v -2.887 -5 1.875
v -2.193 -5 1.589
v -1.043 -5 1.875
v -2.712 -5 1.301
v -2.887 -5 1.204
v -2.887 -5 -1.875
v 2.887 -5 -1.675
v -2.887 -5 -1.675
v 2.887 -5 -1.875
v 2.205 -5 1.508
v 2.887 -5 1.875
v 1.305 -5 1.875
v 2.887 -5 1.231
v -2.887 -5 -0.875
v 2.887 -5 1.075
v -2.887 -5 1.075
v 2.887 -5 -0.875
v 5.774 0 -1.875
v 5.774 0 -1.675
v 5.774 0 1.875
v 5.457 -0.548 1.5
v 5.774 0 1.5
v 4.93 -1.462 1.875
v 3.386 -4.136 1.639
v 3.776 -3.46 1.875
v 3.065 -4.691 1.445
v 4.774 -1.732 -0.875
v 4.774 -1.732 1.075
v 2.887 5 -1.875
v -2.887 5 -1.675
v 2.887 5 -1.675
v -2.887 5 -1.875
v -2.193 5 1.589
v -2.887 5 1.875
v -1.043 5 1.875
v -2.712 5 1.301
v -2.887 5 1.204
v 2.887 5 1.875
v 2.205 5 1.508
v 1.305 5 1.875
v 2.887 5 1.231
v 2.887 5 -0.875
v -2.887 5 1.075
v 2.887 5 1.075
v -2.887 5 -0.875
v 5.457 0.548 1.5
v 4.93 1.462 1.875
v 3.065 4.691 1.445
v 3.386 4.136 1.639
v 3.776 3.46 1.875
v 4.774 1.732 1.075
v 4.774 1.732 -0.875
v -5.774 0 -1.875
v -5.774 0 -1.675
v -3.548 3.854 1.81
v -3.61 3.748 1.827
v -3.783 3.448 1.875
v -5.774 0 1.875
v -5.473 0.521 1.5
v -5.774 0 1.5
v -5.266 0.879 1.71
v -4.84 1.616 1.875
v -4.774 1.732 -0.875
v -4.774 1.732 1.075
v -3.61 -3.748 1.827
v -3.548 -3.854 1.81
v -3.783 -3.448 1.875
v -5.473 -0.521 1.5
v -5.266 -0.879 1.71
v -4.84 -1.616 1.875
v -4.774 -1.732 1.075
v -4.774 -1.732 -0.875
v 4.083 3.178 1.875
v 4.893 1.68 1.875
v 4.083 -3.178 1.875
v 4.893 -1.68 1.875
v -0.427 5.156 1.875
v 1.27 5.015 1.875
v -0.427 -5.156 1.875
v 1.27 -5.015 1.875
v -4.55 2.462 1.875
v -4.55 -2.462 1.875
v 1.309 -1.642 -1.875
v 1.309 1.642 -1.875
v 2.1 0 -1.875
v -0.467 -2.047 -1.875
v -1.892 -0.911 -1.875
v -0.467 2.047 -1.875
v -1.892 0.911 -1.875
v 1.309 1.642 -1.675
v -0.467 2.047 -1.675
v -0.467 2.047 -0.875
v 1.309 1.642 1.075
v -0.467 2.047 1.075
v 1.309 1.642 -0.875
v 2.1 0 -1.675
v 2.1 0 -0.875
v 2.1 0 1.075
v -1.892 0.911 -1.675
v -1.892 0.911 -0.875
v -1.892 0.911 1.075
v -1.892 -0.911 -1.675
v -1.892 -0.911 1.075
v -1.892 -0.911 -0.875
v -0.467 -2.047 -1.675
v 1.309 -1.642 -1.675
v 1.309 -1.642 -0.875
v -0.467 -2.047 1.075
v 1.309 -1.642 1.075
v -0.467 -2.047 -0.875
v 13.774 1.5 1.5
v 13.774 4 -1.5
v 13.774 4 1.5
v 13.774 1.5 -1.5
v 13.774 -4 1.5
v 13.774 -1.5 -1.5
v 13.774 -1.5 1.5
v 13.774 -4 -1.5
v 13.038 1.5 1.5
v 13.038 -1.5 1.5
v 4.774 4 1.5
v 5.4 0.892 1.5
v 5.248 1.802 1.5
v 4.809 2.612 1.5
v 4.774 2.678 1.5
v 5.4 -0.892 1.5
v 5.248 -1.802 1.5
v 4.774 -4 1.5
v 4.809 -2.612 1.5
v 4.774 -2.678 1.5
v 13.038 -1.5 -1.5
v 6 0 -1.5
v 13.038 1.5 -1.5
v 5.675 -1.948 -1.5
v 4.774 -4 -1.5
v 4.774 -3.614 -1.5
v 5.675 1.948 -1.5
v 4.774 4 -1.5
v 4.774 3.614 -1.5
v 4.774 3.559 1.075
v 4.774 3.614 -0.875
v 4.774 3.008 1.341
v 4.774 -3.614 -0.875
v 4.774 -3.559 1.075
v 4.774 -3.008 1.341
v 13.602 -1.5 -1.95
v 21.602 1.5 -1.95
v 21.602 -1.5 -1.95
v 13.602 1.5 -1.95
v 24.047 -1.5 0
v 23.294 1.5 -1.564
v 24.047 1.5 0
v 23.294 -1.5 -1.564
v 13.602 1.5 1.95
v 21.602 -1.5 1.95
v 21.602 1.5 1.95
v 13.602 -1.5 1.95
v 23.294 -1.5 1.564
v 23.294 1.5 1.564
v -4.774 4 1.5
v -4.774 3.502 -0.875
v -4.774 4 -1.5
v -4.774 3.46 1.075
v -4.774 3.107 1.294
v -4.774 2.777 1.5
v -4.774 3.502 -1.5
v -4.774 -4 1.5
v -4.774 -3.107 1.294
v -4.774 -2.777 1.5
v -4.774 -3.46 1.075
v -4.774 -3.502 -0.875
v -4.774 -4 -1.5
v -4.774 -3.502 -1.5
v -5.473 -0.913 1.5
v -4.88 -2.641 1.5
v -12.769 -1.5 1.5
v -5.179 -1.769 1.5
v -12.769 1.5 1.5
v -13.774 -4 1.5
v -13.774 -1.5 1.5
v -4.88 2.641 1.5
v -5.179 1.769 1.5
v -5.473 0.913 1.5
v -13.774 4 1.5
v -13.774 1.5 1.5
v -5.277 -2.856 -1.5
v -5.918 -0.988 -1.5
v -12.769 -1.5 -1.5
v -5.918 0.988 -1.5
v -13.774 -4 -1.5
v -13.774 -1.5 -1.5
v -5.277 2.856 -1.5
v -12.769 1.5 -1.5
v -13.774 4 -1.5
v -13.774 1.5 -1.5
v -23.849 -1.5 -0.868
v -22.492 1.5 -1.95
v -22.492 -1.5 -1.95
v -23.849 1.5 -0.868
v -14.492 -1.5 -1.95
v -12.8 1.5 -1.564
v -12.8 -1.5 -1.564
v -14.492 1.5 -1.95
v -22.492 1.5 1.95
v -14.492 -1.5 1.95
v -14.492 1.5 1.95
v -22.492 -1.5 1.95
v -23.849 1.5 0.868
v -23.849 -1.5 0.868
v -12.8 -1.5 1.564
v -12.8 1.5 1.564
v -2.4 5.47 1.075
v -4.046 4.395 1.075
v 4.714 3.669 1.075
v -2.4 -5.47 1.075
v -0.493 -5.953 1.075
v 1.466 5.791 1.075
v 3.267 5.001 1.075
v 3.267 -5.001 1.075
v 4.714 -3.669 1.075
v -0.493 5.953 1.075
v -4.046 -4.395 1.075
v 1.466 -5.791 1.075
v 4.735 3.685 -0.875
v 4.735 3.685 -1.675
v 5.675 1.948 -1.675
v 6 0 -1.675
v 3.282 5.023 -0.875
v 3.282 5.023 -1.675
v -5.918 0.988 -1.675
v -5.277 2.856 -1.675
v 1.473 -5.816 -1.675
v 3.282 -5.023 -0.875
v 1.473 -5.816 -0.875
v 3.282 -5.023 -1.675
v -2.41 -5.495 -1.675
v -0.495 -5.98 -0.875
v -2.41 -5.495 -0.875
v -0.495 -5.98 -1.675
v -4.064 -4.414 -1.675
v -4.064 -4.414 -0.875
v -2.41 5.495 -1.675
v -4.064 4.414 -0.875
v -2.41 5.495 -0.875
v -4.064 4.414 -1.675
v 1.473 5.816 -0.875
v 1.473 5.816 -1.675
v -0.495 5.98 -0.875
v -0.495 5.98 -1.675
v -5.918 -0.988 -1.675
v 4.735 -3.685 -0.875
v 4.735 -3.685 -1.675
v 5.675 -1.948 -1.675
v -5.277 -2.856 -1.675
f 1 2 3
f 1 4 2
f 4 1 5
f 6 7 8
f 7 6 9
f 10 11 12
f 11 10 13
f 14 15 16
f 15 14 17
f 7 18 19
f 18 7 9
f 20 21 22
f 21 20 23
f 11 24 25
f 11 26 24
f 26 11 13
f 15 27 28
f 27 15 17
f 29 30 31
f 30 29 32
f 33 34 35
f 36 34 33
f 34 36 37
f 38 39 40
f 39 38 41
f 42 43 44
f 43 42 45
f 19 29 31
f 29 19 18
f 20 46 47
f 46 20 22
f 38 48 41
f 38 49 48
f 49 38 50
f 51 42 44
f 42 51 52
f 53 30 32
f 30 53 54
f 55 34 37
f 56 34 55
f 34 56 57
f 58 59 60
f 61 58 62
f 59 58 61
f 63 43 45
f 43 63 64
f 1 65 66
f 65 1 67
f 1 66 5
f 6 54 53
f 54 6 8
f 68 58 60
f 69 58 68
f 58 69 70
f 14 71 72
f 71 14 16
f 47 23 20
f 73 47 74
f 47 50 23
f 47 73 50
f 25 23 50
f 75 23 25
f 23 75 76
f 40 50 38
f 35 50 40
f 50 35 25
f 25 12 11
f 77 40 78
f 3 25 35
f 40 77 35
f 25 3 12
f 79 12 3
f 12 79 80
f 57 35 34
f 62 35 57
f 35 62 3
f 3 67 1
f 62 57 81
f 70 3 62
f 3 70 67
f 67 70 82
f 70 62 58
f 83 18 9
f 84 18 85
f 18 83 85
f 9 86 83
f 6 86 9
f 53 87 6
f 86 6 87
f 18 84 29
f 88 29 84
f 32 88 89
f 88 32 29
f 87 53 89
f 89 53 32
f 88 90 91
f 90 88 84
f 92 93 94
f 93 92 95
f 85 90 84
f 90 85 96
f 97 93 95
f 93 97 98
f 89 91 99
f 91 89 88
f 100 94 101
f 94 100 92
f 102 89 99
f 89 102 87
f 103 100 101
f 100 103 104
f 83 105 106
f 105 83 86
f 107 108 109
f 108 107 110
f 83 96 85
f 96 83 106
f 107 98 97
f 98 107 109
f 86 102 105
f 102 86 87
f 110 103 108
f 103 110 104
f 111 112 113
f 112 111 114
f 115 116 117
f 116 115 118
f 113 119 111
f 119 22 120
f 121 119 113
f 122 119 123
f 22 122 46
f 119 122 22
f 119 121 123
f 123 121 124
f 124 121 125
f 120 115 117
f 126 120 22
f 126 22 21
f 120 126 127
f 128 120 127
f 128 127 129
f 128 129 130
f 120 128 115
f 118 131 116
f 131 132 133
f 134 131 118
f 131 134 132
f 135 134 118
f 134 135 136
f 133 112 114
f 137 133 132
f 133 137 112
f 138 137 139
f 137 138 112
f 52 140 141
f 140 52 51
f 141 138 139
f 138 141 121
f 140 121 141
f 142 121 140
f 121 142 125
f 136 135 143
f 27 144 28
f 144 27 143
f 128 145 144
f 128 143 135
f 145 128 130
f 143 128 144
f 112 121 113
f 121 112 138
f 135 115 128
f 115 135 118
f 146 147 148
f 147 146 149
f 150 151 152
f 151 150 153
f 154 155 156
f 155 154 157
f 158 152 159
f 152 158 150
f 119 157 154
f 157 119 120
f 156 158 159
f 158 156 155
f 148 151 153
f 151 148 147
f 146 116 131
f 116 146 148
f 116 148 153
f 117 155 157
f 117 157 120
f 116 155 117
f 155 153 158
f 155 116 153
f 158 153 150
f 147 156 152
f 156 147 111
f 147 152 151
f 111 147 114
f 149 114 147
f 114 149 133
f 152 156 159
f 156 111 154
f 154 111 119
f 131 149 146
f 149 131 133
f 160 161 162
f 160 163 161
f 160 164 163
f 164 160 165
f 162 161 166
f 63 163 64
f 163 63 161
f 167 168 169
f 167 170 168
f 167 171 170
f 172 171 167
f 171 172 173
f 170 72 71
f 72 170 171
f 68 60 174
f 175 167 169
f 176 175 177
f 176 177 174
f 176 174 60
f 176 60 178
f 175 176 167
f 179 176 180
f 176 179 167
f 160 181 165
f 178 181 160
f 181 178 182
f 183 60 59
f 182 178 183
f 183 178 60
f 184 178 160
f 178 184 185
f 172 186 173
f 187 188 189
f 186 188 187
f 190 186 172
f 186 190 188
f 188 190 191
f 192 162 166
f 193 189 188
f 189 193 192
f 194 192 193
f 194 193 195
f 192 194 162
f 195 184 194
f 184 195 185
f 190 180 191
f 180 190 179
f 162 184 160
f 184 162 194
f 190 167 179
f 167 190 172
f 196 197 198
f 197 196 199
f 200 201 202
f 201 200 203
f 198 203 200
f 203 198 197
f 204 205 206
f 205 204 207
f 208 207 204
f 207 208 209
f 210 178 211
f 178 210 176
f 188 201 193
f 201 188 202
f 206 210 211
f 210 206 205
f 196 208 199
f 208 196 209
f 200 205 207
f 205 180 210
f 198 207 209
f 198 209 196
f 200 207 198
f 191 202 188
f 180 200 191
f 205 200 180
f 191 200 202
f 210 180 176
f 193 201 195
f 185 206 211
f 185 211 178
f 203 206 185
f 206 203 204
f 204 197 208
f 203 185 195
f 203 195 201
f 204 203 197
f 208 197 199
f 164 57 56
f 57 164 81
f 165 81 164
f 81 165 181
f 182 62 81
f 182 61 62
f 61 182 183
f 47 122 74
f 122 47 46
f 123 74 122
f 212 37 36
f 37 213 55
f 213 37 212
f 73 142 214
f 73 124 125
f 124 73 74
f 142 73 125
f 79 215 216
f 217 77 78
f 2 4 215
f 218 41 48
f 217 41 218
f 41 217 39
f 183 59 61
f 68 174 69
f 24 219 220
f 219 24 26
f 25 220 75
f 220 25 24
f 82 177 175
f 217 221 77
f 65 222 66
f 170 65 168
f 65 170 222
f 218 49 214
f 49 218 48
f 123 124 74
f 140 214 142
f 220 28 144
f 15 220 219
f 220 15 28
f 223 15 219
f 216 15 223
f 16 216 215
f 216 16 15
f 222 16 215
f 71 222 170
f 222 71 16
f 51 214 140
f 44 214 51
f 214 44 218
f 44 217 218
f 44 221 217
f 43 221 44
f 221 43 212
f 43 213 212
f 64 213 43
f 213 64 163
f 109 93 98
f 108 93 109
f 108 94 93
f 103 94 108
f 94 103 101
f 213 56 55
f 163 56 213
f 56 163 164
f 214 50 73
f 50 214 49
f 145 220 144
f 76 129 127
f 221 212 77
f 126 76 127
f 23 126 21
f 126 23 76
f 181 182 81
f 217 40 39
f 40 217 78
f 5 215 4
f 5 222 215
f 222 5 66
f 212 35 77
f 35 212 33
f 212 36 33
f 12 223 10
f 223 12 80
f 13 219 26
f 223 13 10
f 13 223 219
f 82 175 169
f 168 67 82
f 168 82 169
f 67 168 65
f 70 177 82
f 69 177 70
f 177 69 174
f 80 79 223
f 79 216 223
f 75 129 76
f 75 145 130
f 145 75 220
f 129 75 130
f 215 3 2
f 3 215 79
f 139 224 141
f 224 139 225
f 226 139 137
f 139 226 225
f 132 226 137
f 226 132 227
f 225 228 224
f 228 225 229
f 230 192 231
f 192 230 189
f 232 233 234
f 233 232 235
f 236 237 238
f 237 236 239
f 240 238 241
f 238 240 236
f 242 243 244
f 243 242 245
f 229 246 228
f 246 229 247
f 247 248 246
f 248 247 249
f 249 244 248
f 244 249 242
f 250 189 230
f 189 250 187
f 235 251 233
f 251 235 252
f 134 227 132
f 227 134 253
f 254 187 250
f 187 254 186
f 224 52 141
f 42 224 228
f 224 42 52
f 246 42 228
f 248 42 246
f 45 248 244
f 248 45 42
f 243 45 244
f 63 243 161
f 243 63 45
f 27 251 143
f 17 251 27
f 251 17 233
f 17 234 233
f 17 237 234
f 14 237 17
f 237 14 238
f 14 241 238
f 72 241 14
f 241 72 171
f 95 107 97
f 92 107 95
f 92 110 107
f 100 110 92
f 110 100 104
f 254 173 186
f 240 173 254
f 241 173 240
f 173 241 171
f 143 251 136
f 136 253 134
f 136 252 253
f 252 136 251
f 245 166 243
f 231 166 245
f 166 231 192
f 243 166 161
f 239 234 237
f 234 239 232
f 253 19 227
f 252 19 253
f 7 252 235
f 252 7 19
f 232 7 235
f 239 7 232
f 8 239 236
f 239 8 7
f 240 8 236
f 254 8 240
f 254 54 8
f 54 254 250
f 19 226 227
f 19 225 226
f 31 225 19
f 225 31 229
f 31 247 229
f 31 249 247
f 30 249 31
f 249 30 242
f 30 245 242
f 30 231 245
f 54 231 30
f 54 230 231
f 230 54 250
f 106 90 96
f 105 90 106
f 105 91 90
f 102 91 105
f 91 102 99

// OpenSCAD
// Parameters
thread_diameter_mm = 4.0; //[2.0:8.0:0.1]
thread_pitch_mm = 0.7; //[0.4:1.5:0.05]
thread_modeling = 0; //[0:1:1]
across_flats_mm = 10.0; //[5.0:20.0:0.1]
thickness_mm = 3.75; //[1.8:7.5:0.05]
wing_count = 2; //[2:2:1]
wing_span_mm = 26.0; //[16.0:40.0:0.5]
wing_length_from_hex_mm = 8.0; //[4.0:16.0:0.5]
wing_thickness_mm = 3.0; //[1.5:6.0:0.1]
wing_height_mm = 8.0; //[4.0:16.0:0.5]
wing_root_fillet_radius_mm = 2.0; //[0.8:5.0:0.1]
hex_edge_chamfer_mm = 0.6; //[0.2:1.5:0.05]
bore_clearance_mm = 0.2; //[0.0:0.6:0.05]
overlap_mm = 1.0; //[0.5:2.0:0.1]
eps_mm = 0.2; //[0.05:0.5:0.05]
washer_outer_diameter_mm = 12.0; //[8.0:24.0:0.5]
washer_thickness_mm = 0.8; //[0.4:2.0:0.05]

// Nut and Washer - complete geometry
module nut_and_washer() {
  color("Silver") {
    // Hex Nut Body
    difference() {
      cylinder(r=across_flats_mm/(2*cos(30)), h=thickness_mm, center=true, $fn=6);
      // Internal Thread or Bore
      translate([0, 0, 0])
        cylinder(r=(thread_diameter_mm + bore_clearance_mm)/2, h=thickness_mm + 2*eps_mm, center=true);
    }
    
    // Wings
    union() {
      // Positive Wing
      translate([across_flats_mm/(2*cos(30)) + (wing_length_from_hex_mm + overlap_mm)/2 - overlap_mm, 0, 0])
        union() {
          cube([wing_length_from_hex_mm + overlap_mm, wing_height_mm, wing_thickness_mm], center=true);
          hull() {
            translate([across_flats_mm/(2*cos(30)) - overlap_mm, 0, 0])
              rotate([90, 0, 0])
              cylinder(r=wing_root_fillet_radius_mm, h=wing_thickness_mm, center=true);
            translate([across_flats_mm/(2*cos(30)) + wing_length_from_hex_mm - overlap_mm, 0, 0])
              rotate([90, 0, 0])
              cylinder(r=wing_root_fillet_radius_mm, h=wing_thickness_mm, center=true);
          }
        }
      
      // Negative Wing
      translate([-(across_flats_mm/(2*cos(30)) + (wing_length_from_hex_mm + overlap_mm)/2 - overlap_mm), 0, 0])
        union() {
          cube([wing_length_from_hex_mm + overlap_mm, wing_height_mm, wing_thickness_mm], center=true);
          hull() {
            translate([-(across_flats_mm/(2*cos(30)) - overlap_mm), 0, 0])
              rotate([90, 0, 0])
              cylinder(r=wing_root_fillet_radius_mm, h=wing_thickness_mm, center=true);
            translate([-(across_flats_mm/(2*cos(30)) + wing_length_from_hex_mm - overlap_mm), 0, 0])
              rotate([90, 0, 0])
              cylinder(r=wing_root_fillet_radius_mm, h=wing_thickness_mm, center=true);
          }
        }
    }
    
    // Washer Flange
    translate([0, 0, -(thickness_mm/2 + washer_thickness_mm/2 - overlap_mm)])
      cylinder(r=washer_outer_diameter_mm/2, h=washer_thickness_mm, center=true);
    
    // Edge Chamfers
    difference() {
      // Top Chamfer
      translate([0, 0, thickness_mm/2 - (hex_edge_chamfer_mm + eps_mm)/2])
        cylinder(r1=across_flats_mm/(2*cos(30)) + eps_mm, r2=across_flats_mm/(2*cos(30)) - hex_edge_chamfer_mm, h=hex_edge_chamfer_mm + eps_mm, center=true);
      
      // Bottom Chamfer
      translate([0, 0, -(thickness_mm/2 - (hex_edge_chamfer_mm + eps_mm)/2)])
        rotate([180, 0, 0])
        cylinder(r1=across_flats_mm/(2*cos(30)) + eps_mm, r2=across_flats_mm/(2*cos(30)) - hex_edge_chamfer_mm, h=hex_edge_chamfer_mm + eps_mm, center=true);
    }
  }
}

// Assembly
module assembly() {
  nut_and_washer();
}

assembly();
